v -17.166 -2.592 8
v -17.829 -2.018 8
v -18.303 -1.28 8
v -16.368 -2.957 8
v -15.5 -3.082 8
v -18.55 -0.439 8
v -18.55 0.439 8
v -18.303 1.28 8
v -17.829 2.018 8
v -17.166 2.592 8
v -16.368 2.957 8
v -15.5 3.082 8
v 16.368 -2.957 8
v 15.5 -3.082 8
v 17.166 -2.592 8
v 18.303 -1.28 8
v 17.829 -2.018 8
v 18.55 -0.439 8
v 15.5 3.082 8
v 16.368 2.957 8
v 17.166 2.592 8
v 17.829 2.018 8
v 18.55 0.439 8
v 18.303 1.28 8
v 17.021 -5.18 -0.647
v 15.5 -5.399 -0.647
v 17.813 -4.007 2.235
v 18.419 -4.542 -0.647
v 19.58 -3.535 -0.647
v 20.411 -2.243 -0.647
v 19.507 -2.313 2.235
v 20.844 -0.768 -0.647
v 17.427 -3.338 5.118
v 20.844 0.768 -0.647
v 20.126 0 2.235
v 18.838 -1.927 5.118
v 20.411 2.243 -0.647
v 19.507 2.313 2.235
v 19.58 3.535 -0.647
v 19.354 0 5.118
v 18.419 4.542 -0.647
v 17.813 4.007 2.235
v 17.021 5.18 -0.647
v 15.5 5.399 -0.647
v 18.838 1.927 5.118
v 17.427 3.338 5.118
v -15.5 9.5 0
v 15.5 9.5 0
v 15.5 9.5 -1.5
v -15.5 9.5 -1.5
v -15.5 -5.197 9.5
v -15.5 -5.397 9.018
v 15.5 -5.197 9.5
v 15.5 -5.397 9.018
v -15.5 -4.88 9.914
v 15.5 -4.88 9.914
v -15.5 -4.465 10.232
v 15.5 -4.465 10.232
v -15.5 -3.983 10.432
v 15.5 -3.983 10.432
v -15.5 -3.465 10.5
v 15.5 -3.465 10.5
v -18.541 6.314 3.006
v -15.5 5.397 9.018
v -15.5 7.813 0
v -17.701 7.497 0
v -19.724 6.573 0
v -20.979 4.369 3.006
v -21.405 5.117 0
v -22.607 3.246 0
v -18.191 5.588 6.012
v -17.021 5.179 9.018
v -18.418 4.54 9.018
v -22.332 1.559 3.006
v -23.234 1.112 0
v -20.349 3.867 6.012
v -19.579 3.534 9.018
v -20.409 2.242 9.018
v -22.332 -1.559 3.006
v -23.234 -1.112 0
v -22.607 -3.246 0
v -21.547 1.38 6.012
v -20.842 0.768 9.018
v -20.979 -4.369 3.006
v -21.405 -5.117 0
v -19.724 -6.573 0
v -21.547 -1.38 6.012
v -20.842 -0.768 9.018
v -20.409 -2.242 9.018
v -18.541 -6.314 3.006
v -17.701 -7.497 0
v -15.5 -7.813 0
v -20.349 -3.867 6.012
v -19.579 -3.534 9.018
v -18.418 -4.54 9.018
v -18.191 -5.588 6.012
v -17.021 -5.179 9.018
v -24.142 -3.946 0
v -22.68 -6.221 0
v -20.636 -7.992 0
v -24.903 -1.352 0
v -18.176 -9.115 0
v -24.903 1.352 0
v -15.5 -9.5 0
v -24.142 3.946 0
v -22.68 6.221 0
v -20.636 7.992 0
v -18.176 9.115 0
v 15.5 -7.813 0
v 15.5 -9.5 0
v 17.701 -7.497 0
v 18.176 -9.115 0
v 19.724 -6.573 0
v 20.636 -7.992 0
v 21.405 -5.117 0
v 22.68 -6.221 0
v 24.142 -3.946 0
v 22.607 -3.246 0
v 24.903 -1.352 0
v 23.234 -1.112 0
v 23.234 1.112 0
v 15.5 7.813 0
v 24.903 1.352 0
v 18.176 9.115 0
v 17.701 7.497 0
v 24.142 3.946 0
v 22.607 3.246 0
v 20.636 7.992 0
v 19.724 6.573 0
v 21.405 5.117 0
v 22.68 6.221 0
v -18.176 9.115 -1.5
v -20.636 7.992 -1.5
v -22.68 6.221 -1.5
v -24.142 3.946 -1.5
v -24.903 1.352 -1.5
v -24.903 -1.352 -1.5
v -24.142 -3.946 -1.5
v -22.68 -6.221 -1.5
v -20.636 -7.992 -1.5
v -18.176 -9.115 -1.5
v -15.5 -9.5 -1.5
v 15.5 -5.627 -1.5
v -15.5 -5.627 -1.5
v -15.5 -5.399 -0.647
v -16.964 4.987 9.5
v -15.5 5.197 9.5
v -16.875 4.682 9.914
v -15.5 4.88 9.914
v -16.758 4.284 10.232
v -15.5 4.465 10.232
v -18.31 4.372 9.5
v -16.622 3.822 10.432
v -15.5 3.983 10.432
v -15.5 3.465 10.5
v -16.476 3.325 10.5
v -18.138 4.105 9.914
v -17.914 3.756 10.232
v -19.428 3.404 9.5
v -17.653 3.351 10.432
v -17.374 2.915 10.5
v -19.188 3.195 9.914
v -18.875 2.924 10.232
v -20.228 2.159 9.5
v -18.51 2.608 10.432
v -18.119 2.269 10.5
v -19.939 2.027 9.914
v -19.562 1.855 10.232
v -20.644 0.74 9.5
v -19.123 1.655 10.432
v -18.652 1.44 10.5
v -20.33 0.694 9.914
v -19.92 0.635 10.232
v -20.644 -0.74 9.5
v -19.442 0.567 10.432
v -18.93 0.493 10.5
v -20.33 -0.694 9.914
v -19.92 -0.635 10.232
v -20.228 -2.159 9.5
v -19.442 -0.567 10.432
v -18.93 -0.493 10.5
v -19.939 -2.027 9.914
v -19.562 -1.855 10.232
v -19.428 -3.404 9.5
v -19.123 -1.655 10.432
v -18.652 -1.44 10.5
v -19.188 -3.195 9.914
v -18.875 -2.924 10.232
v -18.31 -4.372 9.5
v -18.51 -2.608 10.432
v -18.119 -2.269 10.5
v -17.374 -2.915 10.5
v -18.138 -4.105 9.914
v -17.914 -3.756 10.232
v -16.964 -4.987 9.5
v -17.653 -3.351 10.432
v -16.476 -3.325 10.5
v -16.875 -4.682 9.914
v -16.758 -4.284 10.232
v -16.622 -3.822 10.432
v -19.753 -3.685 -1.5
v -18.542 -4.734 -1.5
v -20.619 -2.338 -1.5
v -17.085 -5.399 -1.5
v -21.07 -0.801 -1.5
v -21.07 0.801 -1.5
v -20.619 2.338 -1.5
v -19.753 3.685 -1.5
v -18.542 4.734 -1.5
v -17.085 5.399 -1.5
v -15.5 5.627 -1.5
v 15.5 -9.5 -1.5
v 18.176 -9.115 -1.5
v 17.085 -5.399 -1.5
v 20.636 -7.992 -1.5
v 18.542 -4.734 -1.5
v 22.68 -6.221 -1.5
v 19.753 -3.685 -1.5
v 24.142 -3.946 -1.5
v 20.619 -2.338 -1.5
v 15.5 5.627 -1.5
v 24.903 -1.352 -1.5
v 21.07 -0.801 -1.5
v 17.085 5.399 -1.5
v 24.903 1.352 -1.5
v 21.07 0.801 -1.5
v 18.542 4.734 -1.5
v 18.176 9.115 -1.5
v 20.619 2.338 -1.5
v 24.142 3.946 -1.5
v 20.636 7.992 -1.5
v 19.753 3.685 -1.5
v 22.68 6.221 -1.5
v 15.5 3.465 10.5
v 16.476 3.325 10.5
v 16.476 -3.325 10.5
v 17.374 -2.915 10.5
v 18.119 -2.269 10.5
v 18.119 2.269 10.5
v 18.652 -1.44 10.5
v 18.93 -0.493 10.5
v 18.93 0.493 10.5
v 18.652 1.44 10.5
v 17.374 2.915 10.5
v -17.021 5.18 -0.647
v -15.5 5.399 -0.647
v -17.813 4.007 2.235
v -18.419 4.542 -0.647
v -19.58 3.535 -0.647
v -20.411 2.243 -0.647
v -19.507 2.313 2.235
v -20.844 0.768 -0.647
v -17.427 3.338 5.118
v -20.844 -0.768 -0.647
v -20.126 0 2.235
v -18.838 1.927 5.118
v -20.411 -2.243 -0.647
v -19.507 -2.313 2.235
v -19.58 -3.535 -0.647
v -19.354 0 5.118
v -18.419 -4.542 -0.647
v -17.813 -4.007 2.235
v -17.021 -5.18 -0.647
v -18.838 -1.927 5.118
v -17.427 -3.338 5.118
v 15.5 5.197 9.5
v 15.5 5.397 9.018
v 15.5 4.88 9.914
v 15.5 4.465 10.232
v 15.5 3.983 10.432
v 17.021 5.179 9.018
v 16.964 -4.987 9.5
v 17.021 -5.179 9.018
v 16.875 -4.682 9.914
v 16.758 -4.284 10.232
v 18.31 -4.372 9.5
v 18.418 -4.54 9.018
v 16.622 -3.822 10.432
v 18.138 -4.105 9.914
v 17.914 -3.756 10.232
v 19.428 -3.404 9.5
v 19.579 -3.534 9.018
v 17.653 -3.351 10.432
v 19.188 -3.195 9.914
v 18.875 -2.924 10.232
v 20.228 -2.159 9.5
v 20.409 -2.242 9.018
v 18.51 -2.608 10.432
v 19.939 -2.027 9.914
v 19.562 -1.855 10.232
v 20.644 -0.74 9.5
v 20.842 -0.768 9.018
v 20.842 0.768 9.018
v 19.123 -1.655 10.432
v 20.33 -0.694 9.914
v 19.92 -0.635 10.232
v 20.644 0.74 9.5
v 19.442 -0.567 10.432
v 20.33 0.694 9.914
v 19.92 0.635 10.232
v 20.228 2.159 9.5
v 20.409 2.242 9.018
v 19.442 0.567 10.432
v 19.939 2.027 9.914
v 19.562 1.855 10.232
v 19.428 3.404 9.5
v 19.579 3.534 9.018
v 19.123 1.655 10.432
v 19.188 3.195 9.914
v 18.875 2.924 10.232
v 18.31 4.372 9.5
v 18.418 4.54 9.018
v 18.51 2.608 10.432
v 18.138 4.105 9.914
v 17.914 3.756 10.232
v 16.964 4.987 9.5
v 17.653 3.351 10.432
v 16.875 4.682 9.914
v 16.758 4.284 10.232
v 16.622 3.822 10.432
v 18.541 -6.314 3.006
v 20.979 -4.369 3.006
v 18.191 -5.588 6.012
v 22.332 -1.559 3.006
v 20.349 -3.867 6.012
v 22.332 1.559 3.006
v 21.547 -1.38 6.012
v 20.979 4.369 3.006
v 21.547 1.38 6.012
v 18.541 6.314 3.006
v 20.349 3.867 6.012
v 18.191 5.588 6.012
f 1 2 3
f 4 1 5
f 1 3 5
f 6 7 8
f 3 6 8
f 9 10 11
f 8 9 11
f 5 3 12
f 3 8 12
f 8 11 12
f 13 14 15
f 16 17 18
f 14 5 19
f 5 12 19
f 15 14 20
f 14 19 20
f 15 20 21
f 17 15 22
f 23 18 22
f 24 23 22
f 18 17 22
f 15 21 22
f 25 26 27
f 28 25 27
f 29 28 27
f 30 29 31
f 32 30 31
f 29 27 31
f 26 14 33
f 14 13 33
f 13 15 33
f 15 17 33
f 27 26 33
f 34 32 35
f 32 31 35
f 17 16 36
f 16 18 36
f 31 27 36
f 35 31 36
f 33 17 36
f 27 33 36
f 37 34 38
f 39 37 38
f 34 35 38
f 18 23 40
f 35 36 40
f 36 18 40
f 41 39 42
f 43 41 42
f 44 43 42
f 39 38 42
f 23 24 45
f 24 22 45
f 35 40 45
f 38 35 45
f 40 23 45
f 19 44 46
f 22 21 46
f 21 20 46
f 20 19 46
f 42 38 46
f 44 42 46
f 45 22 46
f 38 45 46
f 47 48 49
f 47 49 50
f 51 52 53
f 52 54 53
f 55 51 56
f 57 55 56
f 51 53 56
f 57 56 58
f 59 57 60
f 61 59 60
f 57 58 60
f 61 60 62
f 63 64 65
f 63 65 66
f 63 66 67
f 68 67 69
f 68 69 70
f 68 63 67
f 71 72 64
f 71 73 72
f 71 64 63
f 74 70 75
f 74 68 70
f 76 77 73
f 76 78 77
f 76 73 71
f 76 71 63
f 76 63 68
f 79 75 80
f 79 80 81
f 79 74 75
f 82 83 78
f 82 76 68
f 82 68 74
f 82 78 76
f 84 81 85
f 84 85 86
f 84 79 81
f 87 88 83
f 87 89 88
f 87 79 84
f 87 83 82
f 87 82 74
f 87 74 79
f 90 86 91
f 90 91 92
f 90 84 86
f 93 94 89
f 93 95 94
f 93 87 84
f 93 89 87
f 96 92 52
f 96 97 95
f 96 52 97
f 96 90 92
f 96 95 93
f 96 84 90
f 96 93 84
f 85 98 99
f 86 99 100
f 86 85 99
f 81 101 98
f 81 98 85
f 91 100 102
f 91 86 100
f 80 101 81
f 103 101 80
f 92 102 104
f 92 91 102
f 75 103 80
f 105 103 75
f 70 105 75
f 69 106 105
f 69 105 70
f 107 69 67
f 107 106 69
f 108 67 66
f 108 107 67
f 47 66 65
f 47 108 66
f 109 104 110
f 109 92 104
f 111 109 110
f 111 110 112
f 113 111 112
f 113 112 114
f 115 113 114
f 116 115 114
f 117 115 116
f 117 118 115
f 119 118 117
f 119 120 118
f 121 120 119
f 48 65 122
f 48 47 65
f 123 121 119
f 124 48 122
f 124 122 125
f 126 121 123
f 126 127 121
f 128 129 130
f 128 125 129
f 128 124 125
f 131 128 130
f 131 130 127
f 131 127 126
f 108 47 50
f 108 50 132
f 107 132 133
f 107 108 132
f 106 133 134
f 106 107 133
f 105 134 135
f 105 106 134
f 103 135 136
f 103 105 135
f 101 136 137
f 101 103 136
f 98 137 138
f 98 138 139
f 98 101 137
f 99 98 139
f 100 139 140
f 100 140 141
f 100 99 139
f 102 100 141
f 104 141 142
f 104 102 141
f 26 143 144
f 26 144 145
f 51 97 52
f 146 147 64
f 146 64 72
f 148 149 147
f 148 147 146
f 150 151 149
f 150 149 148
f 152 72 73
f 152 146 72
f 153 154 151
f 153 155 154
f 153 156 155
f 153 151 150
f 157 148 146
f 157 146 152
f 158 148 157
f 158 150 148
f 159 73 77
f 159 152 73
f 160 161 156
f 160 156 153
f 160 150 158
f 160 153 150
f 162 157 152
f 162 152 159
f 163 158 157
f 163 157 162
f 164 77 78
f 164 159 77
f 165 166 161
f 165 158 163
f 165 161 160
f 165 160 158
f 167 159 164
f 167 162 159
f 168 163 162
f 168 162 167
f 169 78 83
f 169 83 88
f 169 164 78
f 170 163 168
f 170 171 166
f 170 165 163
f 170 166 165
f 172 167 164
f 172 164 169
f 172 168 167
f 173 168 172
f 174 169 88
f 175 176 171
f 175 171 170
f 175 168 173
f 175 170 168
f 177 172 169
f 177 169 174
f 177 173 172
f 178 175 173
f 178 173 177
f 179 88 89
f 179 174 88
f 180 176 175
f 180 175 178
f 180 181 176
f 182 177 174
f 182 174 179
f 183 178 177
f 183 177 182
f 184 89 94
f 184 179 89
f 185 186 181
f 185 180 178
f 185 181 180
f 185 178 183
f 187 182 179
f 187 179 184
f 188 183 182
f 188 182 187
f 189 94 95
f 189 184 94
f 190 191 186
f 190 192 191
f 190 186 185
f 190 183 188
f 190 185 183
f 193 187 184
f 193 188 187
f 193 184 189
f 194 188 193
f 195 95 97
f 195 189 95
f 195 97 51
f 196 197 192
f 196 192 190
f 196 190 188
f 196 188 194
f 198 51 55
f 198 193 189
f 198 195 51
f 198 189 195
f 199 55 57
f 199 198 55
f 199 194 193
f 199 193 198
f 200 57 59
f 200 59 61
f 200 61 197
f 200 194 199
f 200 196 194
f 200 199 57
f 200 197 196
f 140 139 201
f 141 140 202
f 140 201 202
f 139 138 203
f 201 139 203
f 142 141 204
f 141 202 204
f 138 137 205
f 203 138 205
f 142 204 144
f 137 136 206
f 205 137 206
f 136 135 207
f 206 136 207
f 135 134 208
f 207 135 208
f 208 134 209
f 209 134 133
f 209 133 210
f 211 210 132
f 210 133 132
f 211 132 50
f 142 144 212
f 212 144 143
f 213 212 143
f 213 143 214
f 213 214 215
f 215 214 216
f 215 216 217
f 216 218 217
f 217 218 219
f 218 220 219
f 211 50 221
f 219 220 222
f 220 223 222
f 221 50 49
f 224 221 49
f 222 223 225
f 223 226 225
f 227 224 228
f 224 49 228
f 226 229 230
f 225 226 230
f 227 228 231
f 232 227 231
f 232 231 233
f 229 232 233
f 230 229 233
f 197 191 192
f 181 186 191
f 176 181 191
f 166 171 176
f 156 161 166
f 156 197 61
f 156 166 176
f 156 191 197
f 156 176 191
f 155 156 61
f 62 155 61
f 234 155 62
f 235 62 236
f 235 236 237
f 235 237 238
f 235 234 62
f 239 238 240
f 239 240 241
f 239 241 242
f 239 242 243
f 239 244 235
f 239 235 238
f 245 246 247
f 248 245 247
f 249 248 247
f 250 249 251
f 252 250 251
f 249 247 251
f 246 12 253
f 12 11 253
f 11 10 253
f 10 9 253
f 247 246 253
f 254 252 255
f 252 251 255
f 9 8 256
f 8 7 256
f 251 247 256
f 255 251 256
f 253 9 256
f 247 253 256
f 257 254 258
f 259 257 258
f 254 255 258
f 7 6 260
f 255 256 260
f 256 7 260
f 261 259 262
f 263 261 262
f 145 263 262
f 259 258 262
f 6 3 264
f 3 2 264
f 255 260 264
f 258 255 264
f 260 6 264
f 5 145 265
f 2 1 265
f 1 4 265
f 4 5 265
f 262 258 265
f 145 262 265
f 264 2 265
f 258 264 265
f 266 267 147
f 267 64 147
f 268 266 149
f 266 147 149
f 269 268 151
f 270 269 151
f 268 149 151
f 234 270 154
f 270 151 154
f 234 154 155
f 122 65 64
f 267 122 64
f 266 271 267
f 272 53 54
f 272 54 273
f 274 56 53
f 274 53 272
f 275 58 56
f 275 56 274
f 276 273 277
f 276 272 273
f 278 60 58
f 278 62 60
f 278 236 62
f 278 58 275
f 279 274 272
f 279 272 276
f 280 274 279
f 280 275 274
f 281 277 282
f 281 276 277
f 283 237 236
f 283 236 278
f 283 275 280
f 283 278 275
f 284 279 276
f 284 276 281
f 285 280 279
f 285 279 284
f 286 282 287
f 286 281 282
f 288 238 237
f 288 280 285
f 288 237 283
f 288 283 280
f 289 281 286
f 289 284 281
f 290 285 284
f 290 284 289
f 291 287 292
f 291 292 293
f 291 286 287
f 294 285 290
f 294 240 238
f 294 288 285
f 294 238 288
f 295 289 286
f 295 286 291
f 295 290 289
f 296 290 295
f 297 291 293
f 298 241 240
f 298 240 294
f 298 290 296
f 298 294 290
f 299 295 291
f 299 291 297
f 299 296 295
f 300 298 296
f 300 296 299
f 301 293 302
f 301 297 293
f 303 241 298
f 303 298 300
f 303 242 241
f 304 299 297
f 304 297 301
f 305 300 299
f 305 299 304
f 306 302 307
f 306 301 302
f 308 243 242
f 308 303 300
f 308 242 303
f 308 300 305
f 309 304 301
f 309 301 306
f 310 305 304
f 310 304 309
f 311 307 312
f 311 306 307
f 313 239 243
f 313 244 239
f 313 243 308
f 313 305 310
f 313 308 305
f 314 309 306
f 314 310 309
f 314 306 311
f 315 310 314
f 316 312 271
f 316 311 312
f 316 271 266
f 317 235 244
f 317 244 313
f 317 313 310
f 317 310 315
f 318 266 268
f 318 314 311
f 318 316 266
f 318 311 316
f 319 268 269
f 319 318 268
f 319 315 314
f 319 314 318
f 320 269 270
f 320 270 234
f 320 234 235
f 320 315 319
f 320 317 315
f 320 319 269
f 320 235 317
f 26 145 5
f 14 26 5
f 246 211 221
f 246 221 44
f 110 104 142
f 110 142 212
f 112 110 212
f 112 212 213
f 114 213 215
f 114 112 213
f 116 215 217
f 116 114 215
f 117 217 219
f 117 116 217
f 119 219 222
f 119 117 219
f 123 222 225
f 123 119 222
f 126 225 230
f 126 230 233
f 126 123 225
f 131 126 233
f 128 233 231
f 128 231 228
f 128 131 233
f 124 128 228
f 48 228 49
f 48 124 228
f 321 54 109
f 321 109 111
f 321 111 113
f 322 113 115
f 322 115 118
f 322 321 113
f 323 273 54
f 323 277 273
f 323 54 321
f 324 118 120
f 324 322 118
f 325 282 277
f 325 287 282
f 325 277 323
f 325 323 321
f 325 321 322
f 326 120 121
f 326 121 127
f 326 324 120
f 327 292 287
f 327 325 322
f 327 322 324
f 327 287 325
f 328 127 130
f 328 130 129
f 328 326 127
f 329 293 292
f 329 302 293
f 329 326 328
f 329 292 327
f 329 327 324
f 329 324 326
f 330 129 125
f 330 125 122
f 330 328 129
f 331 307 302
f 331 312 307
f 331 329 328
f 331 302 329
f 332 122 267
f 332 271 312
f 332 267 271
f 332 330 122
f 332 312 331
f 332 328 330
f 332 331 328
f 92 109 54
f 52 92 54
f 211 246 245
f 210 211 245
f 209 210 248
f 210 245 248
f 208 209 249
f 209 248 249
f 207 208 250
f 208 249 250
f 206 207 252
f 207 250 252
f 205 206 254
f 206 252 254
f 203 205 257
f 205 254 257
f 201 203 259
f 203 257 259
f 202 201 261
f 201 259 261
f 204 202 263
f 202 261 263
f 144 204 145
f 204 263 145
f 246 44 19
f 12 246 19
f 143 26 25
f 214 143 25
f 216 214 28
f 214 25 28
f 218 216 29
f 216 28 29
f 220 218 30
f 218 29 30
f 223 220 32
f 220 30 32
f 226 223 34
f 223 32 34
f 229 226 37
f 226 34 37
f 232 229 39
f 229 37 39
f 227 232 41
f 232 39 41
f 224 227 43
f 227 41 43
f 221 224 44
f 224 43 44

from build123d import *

# Parameters (mm, degrees)
F1_DEPTH     = 1.5
F3_DEPTH     = 10.5
F4_T4_DEPTH  = 31
F4_T9_ANGLE  = 180
F4_T14_DEPTH = 31
F4_T19_ANGLE = 180
F5_T         = 2.5
F5_T3_DEPTH  = 36
F5_T6_ANGLE  = 180.000000001
F5_T8_ANGLE  = 180.000000001
F6_R         = 2


# Not quite as in the source:
# - a fillet or chamfer that OpenCascade refuses, or shapes differently, is made with other operations: its cross-section is extruded or revolved along the edge and cut away or added
# - a shell that OpenCascade refuses in one call is made with other operations: the cavity is built on its own and cut out


with BuildPart() as f1:
    # F0 (on Top) → F1 (new body)
    with BuildSketch(Plane.XY):
        with BuildLine():
            Line((15.5, 9.5), (-15.5, 9.5))
            ThreePointArc((-15.5, 9.5), (-25, 0), (-15.5, -9.5))
            Line((-15.5, -9.5), (15.5, -9.5))
            ThreePointArc((15.5, -9.5), (25, 0), (15.5, 9.5))
        make_face()
        with BuildLine():
            ThreePointArc((-15.5, -8), (-23.5, 0), (-15.5, 8))
            Line((-15.5, 8), (15.5, 8))
            ThreePointArc((15.5, 8), (23.5, 0), (15.5, -8))
            Line((15.5, -8), (-15.5, -8))
        make_face(mode=Mode.SUBTRACT)
        with BuildLine():
            Line((15.5, 8), (-15.5, 8))
            ThreePointArc((-15.5, 8), (-23.5, 0), (-15.5, -8))
            Line((-15.5, -8), (15.5, -8))
            ThreePointArc((15.5, -8), (23.5, 0), (15.5, 8))
        make_face()
    extrude(amount=-F1_DEPTH)

    # F2 (on face) → F3 (join)
    with BuildSketch(Plane.XY):
        with BuildLine():
            Line((15.5, 8), (-15.5, 8))
            ThreePointArc((-15.5, 8), (-23.5, 0), (-15.5, -8))
            Line((-15.5, -8), (15.5, -8))
            ThreePointArc((15.5, -8), (23.5, 0), (15.5, 8))
        make_face()
    extrude(amount=F3_DEPTH)

    # F4: chamfer of 3 x 11.1961524227 on 4 edges, made by hand


with BuildPart() as f4_tool2:
    # F4_s3 → F4_t4 (new body)
    with BuildSketch(Plane.YZ.offset(-15.5)):
        Polygon((-8, -0.6961524227), (-5, 10.5), (-8, 10.5), align=None)
    extrude(amount=F4_T4_DEPTH)

    split(bisect_by=Plane.XY, keep=Keep.TOP)


with BuildPart() as f1_1:
    add(f1.part)

    # F4_t1: cut F4_tool2
    add(f4_tool2.part, mode=Mode.SUBTRACT)


with BuildPart() as f4_tool7:
    # F4_s8 → F4_t9 (revolve)
    with BuildSketch(Plane.YZ.offset(15.5)):
        Polygon((-8, -0.6961524227), (-5, 10.5), (-8, 10.5), align=None)
    revolve(axis=Axis((15.5, 0, 10.5), (0, 0, 1)), revolution_arc=F4_T9_ANGLE)

    split(bisect_by=Plane.XY, keep=Keep.TOP)


with BuildPart() as f1_2:
    add(f1_1.part)

    # F4_t6: cut F4_tool7
    add(f4_tool7.part, mode=Mode.SUBTRACT)


with BuildPart() as f4_tool12:
    # F4_s13 → F4_t14 (new body)
    with BuildSketch(Plane.YZ.offset(15.5)):
        Polygon((8, -0.6961524227), (5, 10.5), (8, 10.5), align=None)
    extrude(amount=-F4_T14_DEPTH)

    split(bisect_by=Plane.XY, keep=Keep.TOP)


with BuildPart() as f1_3:
    add(f1_2.part)

    # F4_t11: cut F4_tool12
    add(f4_tool12.part, mode=Mode.SUBTRACT)


with BuildPart() as f4_tool17:
    # F4_s18 → F4_t19 (revolve)
    with BuildSketch(Plane.YZ.offset(-15.5)):
        Polygon((8, -0.6961524227), (5, 10.5), (8, 10.5), align=None)
    revolve(axis=Axis((-15.5, 0, 10.5), (0, 0, 1)), revolution_arc=F4_T19_ANGLE)

    split(bisect_by=Plane.XY, keep=Keep.TOP)


with BuildPart() as f1_4:
    add(f1_3.part)

    # F4_t16: cut F4_tool17
    add(f4_tool17.part, mode=Mode.SUBTRACT)

    # F5: shell of thickness 2.5, made by hand


with BuildPart() as f5_core1:
    # F5_t2: copy of F1
    add(f1_4.part)

    # the walls: a layer under each face that stays
    f5_faces = [f5_core1.faces().sort_by_distance(p)[0] for p in [
        (25, 0, -0.75),
        (0, -9.5, -0.75),
        (0, 9.5, -0.75),
        (-21.4285714286, -5.4285714286, 0),
        (-25, 0, -0.75),
        (0, -6.4067332603, 5.25),
        (0, 6.4067332603, 5.25),
        (21.9067332603, 0, 5.25),
        (-21.9067332603, 0, 5.25),
        (0, 0, 10.5),
    ]]
    thicken(f5_faces, amount=-F5_T, mode=Mode.SUBTRACT)

    # F5_s4 → F5_t3 (cut)
    with BuildSketch(Plane.YZ.offset(-18)):
        Polygon((-7.8376146662, 0.0314704761), (-7.8134665205, -2.5), (-5.8951490506, -2.5), (-5.3986519548, -0.6470476128), align=None)
        Polygon((7.8376146662, 0.0314704761), (7.8134665205, -2.5), (5.8951490506, -2.5), (5.3986519548, -0.6470476128), align=None)
    extrude(amount=F5_T3_DEPTH, mode=Mode.SUBTRACT)

    # F5_s5 → F5_t6 (revolve, cut)
    with BuildSketch(Plane.YZ.offset(-15.5)):
        Polygon((7.8376146662, 0.0314704761), (7.8134665205, -2.5), (5.8951490506, -2.5), (5.3986519548, -0.6470476128), align=None)
    revolve(axis=Axis((-15.5, 0, 0), (0, 0, 1)), revolution_arc=F5_T6_ANGLE, mode=Mode.SUBTRACT)

    # F5_s7 → F5_t8 (revolve, cut)
    with BuildSketch(Plane.YZ.offset(15.5)):
        Polygon((-7.8376146662, 0.0314704761), (-7.8134665205, -2.5), (-5.8951490506, -2.5), (-5.3986519548, -0.6470476128), align=None)
    revolve(axis=Axis((15.5, 0, 0), (0, 0, 1)), revolution_arc=F5_T8_ANGLE, mode=Mode.SUBTRACT)


with BuildPart() as f1_5:
    add(f1_4.part)

    # what is left inside the walls is the cavity
    f5_cavity = [f5_core1.part.solids().sort_by_distance(p)[0] for p in [
        (0, -1.875733, -1.475),
    ]]
    add(f5_cavity, mode=Mode.SUBTRACT)

    # F6
    f6_edges = [f1_5.edges().sort_by_distance(p)[0] for p in [
        (-20.5, 0, 10.5),
    ]]
    fillet(f6_edges, radius=F6_R)


solid = f1_5.part
